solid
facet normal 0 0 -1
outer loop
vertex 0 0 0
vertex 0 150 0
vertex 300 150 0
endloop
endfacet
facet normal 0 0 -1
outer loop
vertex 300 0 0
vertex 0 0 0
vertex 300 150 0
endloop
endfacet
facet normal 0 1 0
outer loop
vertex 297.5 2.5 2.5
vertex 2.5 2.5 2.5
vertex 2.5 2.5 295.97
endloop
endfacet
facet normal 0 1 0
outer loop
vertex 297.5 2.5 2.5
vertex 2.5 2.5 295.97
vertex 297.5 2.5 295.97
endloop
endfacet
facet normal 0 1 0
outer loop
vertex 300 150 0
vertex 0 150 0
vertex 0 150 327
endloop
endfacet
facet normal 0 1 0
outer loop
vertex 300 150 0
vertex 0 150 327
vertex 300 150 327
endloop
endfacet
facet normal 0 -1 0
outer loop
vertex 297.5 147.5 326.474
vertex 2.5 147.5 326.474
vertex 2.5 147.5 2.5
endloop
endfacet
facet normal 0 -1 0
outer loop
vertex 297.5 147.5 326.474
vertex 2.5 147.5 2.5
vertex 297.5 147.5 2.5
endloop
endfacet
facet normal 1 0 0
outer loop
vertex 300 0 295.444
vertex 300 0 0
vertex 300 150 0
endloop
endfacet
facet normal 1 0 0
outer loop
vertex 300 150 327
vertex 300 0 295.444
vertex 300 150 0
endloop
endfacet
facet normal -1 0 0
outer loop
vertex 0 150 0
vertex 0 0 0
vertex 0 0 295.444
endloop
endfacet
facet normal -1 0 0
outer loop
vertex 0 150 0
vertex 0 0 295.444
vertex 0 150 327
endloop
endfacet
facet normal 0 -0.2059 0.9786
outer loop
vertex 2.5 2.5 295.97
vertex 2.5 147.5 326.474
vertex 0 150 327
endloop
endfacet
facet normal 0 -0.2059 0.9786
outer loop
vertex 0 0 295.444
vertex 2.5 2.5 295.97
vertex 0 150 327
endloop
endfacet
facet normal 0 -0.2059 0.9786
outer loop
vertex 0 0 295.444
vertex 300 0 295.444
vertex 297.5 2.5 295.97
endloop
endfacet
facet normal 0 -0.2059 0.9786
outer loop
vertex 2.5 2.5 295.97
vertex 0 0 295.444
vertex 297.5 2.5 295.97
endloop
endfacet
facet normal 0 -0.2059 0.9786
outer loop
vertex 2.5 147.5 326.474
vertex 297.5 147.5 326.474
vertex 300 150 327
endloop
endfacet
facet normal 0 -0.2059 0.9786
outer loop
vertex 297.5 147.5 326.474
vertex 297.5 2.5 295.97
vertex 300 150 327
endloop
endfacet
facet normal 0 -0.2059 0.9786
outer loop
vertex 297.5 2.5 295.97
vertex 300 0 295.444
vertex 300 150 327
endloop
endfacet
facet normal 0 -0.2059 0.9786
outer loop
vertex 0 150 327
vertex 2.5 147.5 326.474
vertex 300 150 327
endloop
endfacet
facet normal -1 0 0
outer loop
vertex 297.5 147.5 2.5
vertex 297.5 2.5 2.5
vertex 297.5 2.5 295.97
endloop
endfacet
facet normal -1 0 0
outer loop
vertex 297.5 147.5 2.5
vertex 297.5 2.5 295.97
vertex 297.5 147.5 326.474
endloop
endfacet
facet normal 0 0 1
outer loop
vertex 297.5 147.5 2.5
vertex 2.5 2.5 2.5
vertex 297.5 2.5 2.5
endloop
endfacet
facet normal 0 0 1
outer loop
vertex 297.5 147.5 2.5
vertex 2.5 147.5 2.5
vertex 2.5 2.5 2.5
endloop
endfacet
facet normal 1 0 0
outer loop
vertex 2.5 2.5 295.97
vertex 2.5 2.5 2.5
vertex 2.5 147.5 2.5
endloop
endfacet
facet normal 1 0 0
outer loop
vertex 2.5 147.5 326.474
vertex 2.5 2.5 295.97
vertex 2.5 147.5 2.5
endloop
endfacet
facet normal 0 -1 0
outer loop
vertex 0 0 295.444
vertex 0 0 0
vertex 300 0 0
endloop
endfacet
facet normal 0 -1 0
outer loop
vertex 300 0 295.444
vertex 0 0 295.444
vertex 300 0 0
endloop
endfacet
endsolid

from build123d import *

# Parameters (mm, degrees)
F0_W     = 300
F0_H     = 150
F1_DEPTH = 327
F2_T     = -2.5
F4_DEPTH = 346


with BuildPart() as f1:
    # F0 (on Top) → F1 (new body)
    with BuildSketch(Plane.XY):
        with Locations((150, 75)):
            Rectangle(F0_W, F0_H)
    extrude(amount=F1_DEPTH)

    # F2
    f2_openings = [f1.faces().sort_by_distance(p)[0] for p in [
        (150, 75, 327),
    ]]
    offset(amount=F2_T, openings=f2_openings)

    # F3 (on face) → F4 (cut)
    with BuildSketch(Plane.YZ.offset(300)):
        Polygon((0, 295.443952), (150, 327), (0, 327), align=None)
    extrude(amount=-F4_DEPTH, mode=Mode.SUBTRACT)


solid = f1.part
